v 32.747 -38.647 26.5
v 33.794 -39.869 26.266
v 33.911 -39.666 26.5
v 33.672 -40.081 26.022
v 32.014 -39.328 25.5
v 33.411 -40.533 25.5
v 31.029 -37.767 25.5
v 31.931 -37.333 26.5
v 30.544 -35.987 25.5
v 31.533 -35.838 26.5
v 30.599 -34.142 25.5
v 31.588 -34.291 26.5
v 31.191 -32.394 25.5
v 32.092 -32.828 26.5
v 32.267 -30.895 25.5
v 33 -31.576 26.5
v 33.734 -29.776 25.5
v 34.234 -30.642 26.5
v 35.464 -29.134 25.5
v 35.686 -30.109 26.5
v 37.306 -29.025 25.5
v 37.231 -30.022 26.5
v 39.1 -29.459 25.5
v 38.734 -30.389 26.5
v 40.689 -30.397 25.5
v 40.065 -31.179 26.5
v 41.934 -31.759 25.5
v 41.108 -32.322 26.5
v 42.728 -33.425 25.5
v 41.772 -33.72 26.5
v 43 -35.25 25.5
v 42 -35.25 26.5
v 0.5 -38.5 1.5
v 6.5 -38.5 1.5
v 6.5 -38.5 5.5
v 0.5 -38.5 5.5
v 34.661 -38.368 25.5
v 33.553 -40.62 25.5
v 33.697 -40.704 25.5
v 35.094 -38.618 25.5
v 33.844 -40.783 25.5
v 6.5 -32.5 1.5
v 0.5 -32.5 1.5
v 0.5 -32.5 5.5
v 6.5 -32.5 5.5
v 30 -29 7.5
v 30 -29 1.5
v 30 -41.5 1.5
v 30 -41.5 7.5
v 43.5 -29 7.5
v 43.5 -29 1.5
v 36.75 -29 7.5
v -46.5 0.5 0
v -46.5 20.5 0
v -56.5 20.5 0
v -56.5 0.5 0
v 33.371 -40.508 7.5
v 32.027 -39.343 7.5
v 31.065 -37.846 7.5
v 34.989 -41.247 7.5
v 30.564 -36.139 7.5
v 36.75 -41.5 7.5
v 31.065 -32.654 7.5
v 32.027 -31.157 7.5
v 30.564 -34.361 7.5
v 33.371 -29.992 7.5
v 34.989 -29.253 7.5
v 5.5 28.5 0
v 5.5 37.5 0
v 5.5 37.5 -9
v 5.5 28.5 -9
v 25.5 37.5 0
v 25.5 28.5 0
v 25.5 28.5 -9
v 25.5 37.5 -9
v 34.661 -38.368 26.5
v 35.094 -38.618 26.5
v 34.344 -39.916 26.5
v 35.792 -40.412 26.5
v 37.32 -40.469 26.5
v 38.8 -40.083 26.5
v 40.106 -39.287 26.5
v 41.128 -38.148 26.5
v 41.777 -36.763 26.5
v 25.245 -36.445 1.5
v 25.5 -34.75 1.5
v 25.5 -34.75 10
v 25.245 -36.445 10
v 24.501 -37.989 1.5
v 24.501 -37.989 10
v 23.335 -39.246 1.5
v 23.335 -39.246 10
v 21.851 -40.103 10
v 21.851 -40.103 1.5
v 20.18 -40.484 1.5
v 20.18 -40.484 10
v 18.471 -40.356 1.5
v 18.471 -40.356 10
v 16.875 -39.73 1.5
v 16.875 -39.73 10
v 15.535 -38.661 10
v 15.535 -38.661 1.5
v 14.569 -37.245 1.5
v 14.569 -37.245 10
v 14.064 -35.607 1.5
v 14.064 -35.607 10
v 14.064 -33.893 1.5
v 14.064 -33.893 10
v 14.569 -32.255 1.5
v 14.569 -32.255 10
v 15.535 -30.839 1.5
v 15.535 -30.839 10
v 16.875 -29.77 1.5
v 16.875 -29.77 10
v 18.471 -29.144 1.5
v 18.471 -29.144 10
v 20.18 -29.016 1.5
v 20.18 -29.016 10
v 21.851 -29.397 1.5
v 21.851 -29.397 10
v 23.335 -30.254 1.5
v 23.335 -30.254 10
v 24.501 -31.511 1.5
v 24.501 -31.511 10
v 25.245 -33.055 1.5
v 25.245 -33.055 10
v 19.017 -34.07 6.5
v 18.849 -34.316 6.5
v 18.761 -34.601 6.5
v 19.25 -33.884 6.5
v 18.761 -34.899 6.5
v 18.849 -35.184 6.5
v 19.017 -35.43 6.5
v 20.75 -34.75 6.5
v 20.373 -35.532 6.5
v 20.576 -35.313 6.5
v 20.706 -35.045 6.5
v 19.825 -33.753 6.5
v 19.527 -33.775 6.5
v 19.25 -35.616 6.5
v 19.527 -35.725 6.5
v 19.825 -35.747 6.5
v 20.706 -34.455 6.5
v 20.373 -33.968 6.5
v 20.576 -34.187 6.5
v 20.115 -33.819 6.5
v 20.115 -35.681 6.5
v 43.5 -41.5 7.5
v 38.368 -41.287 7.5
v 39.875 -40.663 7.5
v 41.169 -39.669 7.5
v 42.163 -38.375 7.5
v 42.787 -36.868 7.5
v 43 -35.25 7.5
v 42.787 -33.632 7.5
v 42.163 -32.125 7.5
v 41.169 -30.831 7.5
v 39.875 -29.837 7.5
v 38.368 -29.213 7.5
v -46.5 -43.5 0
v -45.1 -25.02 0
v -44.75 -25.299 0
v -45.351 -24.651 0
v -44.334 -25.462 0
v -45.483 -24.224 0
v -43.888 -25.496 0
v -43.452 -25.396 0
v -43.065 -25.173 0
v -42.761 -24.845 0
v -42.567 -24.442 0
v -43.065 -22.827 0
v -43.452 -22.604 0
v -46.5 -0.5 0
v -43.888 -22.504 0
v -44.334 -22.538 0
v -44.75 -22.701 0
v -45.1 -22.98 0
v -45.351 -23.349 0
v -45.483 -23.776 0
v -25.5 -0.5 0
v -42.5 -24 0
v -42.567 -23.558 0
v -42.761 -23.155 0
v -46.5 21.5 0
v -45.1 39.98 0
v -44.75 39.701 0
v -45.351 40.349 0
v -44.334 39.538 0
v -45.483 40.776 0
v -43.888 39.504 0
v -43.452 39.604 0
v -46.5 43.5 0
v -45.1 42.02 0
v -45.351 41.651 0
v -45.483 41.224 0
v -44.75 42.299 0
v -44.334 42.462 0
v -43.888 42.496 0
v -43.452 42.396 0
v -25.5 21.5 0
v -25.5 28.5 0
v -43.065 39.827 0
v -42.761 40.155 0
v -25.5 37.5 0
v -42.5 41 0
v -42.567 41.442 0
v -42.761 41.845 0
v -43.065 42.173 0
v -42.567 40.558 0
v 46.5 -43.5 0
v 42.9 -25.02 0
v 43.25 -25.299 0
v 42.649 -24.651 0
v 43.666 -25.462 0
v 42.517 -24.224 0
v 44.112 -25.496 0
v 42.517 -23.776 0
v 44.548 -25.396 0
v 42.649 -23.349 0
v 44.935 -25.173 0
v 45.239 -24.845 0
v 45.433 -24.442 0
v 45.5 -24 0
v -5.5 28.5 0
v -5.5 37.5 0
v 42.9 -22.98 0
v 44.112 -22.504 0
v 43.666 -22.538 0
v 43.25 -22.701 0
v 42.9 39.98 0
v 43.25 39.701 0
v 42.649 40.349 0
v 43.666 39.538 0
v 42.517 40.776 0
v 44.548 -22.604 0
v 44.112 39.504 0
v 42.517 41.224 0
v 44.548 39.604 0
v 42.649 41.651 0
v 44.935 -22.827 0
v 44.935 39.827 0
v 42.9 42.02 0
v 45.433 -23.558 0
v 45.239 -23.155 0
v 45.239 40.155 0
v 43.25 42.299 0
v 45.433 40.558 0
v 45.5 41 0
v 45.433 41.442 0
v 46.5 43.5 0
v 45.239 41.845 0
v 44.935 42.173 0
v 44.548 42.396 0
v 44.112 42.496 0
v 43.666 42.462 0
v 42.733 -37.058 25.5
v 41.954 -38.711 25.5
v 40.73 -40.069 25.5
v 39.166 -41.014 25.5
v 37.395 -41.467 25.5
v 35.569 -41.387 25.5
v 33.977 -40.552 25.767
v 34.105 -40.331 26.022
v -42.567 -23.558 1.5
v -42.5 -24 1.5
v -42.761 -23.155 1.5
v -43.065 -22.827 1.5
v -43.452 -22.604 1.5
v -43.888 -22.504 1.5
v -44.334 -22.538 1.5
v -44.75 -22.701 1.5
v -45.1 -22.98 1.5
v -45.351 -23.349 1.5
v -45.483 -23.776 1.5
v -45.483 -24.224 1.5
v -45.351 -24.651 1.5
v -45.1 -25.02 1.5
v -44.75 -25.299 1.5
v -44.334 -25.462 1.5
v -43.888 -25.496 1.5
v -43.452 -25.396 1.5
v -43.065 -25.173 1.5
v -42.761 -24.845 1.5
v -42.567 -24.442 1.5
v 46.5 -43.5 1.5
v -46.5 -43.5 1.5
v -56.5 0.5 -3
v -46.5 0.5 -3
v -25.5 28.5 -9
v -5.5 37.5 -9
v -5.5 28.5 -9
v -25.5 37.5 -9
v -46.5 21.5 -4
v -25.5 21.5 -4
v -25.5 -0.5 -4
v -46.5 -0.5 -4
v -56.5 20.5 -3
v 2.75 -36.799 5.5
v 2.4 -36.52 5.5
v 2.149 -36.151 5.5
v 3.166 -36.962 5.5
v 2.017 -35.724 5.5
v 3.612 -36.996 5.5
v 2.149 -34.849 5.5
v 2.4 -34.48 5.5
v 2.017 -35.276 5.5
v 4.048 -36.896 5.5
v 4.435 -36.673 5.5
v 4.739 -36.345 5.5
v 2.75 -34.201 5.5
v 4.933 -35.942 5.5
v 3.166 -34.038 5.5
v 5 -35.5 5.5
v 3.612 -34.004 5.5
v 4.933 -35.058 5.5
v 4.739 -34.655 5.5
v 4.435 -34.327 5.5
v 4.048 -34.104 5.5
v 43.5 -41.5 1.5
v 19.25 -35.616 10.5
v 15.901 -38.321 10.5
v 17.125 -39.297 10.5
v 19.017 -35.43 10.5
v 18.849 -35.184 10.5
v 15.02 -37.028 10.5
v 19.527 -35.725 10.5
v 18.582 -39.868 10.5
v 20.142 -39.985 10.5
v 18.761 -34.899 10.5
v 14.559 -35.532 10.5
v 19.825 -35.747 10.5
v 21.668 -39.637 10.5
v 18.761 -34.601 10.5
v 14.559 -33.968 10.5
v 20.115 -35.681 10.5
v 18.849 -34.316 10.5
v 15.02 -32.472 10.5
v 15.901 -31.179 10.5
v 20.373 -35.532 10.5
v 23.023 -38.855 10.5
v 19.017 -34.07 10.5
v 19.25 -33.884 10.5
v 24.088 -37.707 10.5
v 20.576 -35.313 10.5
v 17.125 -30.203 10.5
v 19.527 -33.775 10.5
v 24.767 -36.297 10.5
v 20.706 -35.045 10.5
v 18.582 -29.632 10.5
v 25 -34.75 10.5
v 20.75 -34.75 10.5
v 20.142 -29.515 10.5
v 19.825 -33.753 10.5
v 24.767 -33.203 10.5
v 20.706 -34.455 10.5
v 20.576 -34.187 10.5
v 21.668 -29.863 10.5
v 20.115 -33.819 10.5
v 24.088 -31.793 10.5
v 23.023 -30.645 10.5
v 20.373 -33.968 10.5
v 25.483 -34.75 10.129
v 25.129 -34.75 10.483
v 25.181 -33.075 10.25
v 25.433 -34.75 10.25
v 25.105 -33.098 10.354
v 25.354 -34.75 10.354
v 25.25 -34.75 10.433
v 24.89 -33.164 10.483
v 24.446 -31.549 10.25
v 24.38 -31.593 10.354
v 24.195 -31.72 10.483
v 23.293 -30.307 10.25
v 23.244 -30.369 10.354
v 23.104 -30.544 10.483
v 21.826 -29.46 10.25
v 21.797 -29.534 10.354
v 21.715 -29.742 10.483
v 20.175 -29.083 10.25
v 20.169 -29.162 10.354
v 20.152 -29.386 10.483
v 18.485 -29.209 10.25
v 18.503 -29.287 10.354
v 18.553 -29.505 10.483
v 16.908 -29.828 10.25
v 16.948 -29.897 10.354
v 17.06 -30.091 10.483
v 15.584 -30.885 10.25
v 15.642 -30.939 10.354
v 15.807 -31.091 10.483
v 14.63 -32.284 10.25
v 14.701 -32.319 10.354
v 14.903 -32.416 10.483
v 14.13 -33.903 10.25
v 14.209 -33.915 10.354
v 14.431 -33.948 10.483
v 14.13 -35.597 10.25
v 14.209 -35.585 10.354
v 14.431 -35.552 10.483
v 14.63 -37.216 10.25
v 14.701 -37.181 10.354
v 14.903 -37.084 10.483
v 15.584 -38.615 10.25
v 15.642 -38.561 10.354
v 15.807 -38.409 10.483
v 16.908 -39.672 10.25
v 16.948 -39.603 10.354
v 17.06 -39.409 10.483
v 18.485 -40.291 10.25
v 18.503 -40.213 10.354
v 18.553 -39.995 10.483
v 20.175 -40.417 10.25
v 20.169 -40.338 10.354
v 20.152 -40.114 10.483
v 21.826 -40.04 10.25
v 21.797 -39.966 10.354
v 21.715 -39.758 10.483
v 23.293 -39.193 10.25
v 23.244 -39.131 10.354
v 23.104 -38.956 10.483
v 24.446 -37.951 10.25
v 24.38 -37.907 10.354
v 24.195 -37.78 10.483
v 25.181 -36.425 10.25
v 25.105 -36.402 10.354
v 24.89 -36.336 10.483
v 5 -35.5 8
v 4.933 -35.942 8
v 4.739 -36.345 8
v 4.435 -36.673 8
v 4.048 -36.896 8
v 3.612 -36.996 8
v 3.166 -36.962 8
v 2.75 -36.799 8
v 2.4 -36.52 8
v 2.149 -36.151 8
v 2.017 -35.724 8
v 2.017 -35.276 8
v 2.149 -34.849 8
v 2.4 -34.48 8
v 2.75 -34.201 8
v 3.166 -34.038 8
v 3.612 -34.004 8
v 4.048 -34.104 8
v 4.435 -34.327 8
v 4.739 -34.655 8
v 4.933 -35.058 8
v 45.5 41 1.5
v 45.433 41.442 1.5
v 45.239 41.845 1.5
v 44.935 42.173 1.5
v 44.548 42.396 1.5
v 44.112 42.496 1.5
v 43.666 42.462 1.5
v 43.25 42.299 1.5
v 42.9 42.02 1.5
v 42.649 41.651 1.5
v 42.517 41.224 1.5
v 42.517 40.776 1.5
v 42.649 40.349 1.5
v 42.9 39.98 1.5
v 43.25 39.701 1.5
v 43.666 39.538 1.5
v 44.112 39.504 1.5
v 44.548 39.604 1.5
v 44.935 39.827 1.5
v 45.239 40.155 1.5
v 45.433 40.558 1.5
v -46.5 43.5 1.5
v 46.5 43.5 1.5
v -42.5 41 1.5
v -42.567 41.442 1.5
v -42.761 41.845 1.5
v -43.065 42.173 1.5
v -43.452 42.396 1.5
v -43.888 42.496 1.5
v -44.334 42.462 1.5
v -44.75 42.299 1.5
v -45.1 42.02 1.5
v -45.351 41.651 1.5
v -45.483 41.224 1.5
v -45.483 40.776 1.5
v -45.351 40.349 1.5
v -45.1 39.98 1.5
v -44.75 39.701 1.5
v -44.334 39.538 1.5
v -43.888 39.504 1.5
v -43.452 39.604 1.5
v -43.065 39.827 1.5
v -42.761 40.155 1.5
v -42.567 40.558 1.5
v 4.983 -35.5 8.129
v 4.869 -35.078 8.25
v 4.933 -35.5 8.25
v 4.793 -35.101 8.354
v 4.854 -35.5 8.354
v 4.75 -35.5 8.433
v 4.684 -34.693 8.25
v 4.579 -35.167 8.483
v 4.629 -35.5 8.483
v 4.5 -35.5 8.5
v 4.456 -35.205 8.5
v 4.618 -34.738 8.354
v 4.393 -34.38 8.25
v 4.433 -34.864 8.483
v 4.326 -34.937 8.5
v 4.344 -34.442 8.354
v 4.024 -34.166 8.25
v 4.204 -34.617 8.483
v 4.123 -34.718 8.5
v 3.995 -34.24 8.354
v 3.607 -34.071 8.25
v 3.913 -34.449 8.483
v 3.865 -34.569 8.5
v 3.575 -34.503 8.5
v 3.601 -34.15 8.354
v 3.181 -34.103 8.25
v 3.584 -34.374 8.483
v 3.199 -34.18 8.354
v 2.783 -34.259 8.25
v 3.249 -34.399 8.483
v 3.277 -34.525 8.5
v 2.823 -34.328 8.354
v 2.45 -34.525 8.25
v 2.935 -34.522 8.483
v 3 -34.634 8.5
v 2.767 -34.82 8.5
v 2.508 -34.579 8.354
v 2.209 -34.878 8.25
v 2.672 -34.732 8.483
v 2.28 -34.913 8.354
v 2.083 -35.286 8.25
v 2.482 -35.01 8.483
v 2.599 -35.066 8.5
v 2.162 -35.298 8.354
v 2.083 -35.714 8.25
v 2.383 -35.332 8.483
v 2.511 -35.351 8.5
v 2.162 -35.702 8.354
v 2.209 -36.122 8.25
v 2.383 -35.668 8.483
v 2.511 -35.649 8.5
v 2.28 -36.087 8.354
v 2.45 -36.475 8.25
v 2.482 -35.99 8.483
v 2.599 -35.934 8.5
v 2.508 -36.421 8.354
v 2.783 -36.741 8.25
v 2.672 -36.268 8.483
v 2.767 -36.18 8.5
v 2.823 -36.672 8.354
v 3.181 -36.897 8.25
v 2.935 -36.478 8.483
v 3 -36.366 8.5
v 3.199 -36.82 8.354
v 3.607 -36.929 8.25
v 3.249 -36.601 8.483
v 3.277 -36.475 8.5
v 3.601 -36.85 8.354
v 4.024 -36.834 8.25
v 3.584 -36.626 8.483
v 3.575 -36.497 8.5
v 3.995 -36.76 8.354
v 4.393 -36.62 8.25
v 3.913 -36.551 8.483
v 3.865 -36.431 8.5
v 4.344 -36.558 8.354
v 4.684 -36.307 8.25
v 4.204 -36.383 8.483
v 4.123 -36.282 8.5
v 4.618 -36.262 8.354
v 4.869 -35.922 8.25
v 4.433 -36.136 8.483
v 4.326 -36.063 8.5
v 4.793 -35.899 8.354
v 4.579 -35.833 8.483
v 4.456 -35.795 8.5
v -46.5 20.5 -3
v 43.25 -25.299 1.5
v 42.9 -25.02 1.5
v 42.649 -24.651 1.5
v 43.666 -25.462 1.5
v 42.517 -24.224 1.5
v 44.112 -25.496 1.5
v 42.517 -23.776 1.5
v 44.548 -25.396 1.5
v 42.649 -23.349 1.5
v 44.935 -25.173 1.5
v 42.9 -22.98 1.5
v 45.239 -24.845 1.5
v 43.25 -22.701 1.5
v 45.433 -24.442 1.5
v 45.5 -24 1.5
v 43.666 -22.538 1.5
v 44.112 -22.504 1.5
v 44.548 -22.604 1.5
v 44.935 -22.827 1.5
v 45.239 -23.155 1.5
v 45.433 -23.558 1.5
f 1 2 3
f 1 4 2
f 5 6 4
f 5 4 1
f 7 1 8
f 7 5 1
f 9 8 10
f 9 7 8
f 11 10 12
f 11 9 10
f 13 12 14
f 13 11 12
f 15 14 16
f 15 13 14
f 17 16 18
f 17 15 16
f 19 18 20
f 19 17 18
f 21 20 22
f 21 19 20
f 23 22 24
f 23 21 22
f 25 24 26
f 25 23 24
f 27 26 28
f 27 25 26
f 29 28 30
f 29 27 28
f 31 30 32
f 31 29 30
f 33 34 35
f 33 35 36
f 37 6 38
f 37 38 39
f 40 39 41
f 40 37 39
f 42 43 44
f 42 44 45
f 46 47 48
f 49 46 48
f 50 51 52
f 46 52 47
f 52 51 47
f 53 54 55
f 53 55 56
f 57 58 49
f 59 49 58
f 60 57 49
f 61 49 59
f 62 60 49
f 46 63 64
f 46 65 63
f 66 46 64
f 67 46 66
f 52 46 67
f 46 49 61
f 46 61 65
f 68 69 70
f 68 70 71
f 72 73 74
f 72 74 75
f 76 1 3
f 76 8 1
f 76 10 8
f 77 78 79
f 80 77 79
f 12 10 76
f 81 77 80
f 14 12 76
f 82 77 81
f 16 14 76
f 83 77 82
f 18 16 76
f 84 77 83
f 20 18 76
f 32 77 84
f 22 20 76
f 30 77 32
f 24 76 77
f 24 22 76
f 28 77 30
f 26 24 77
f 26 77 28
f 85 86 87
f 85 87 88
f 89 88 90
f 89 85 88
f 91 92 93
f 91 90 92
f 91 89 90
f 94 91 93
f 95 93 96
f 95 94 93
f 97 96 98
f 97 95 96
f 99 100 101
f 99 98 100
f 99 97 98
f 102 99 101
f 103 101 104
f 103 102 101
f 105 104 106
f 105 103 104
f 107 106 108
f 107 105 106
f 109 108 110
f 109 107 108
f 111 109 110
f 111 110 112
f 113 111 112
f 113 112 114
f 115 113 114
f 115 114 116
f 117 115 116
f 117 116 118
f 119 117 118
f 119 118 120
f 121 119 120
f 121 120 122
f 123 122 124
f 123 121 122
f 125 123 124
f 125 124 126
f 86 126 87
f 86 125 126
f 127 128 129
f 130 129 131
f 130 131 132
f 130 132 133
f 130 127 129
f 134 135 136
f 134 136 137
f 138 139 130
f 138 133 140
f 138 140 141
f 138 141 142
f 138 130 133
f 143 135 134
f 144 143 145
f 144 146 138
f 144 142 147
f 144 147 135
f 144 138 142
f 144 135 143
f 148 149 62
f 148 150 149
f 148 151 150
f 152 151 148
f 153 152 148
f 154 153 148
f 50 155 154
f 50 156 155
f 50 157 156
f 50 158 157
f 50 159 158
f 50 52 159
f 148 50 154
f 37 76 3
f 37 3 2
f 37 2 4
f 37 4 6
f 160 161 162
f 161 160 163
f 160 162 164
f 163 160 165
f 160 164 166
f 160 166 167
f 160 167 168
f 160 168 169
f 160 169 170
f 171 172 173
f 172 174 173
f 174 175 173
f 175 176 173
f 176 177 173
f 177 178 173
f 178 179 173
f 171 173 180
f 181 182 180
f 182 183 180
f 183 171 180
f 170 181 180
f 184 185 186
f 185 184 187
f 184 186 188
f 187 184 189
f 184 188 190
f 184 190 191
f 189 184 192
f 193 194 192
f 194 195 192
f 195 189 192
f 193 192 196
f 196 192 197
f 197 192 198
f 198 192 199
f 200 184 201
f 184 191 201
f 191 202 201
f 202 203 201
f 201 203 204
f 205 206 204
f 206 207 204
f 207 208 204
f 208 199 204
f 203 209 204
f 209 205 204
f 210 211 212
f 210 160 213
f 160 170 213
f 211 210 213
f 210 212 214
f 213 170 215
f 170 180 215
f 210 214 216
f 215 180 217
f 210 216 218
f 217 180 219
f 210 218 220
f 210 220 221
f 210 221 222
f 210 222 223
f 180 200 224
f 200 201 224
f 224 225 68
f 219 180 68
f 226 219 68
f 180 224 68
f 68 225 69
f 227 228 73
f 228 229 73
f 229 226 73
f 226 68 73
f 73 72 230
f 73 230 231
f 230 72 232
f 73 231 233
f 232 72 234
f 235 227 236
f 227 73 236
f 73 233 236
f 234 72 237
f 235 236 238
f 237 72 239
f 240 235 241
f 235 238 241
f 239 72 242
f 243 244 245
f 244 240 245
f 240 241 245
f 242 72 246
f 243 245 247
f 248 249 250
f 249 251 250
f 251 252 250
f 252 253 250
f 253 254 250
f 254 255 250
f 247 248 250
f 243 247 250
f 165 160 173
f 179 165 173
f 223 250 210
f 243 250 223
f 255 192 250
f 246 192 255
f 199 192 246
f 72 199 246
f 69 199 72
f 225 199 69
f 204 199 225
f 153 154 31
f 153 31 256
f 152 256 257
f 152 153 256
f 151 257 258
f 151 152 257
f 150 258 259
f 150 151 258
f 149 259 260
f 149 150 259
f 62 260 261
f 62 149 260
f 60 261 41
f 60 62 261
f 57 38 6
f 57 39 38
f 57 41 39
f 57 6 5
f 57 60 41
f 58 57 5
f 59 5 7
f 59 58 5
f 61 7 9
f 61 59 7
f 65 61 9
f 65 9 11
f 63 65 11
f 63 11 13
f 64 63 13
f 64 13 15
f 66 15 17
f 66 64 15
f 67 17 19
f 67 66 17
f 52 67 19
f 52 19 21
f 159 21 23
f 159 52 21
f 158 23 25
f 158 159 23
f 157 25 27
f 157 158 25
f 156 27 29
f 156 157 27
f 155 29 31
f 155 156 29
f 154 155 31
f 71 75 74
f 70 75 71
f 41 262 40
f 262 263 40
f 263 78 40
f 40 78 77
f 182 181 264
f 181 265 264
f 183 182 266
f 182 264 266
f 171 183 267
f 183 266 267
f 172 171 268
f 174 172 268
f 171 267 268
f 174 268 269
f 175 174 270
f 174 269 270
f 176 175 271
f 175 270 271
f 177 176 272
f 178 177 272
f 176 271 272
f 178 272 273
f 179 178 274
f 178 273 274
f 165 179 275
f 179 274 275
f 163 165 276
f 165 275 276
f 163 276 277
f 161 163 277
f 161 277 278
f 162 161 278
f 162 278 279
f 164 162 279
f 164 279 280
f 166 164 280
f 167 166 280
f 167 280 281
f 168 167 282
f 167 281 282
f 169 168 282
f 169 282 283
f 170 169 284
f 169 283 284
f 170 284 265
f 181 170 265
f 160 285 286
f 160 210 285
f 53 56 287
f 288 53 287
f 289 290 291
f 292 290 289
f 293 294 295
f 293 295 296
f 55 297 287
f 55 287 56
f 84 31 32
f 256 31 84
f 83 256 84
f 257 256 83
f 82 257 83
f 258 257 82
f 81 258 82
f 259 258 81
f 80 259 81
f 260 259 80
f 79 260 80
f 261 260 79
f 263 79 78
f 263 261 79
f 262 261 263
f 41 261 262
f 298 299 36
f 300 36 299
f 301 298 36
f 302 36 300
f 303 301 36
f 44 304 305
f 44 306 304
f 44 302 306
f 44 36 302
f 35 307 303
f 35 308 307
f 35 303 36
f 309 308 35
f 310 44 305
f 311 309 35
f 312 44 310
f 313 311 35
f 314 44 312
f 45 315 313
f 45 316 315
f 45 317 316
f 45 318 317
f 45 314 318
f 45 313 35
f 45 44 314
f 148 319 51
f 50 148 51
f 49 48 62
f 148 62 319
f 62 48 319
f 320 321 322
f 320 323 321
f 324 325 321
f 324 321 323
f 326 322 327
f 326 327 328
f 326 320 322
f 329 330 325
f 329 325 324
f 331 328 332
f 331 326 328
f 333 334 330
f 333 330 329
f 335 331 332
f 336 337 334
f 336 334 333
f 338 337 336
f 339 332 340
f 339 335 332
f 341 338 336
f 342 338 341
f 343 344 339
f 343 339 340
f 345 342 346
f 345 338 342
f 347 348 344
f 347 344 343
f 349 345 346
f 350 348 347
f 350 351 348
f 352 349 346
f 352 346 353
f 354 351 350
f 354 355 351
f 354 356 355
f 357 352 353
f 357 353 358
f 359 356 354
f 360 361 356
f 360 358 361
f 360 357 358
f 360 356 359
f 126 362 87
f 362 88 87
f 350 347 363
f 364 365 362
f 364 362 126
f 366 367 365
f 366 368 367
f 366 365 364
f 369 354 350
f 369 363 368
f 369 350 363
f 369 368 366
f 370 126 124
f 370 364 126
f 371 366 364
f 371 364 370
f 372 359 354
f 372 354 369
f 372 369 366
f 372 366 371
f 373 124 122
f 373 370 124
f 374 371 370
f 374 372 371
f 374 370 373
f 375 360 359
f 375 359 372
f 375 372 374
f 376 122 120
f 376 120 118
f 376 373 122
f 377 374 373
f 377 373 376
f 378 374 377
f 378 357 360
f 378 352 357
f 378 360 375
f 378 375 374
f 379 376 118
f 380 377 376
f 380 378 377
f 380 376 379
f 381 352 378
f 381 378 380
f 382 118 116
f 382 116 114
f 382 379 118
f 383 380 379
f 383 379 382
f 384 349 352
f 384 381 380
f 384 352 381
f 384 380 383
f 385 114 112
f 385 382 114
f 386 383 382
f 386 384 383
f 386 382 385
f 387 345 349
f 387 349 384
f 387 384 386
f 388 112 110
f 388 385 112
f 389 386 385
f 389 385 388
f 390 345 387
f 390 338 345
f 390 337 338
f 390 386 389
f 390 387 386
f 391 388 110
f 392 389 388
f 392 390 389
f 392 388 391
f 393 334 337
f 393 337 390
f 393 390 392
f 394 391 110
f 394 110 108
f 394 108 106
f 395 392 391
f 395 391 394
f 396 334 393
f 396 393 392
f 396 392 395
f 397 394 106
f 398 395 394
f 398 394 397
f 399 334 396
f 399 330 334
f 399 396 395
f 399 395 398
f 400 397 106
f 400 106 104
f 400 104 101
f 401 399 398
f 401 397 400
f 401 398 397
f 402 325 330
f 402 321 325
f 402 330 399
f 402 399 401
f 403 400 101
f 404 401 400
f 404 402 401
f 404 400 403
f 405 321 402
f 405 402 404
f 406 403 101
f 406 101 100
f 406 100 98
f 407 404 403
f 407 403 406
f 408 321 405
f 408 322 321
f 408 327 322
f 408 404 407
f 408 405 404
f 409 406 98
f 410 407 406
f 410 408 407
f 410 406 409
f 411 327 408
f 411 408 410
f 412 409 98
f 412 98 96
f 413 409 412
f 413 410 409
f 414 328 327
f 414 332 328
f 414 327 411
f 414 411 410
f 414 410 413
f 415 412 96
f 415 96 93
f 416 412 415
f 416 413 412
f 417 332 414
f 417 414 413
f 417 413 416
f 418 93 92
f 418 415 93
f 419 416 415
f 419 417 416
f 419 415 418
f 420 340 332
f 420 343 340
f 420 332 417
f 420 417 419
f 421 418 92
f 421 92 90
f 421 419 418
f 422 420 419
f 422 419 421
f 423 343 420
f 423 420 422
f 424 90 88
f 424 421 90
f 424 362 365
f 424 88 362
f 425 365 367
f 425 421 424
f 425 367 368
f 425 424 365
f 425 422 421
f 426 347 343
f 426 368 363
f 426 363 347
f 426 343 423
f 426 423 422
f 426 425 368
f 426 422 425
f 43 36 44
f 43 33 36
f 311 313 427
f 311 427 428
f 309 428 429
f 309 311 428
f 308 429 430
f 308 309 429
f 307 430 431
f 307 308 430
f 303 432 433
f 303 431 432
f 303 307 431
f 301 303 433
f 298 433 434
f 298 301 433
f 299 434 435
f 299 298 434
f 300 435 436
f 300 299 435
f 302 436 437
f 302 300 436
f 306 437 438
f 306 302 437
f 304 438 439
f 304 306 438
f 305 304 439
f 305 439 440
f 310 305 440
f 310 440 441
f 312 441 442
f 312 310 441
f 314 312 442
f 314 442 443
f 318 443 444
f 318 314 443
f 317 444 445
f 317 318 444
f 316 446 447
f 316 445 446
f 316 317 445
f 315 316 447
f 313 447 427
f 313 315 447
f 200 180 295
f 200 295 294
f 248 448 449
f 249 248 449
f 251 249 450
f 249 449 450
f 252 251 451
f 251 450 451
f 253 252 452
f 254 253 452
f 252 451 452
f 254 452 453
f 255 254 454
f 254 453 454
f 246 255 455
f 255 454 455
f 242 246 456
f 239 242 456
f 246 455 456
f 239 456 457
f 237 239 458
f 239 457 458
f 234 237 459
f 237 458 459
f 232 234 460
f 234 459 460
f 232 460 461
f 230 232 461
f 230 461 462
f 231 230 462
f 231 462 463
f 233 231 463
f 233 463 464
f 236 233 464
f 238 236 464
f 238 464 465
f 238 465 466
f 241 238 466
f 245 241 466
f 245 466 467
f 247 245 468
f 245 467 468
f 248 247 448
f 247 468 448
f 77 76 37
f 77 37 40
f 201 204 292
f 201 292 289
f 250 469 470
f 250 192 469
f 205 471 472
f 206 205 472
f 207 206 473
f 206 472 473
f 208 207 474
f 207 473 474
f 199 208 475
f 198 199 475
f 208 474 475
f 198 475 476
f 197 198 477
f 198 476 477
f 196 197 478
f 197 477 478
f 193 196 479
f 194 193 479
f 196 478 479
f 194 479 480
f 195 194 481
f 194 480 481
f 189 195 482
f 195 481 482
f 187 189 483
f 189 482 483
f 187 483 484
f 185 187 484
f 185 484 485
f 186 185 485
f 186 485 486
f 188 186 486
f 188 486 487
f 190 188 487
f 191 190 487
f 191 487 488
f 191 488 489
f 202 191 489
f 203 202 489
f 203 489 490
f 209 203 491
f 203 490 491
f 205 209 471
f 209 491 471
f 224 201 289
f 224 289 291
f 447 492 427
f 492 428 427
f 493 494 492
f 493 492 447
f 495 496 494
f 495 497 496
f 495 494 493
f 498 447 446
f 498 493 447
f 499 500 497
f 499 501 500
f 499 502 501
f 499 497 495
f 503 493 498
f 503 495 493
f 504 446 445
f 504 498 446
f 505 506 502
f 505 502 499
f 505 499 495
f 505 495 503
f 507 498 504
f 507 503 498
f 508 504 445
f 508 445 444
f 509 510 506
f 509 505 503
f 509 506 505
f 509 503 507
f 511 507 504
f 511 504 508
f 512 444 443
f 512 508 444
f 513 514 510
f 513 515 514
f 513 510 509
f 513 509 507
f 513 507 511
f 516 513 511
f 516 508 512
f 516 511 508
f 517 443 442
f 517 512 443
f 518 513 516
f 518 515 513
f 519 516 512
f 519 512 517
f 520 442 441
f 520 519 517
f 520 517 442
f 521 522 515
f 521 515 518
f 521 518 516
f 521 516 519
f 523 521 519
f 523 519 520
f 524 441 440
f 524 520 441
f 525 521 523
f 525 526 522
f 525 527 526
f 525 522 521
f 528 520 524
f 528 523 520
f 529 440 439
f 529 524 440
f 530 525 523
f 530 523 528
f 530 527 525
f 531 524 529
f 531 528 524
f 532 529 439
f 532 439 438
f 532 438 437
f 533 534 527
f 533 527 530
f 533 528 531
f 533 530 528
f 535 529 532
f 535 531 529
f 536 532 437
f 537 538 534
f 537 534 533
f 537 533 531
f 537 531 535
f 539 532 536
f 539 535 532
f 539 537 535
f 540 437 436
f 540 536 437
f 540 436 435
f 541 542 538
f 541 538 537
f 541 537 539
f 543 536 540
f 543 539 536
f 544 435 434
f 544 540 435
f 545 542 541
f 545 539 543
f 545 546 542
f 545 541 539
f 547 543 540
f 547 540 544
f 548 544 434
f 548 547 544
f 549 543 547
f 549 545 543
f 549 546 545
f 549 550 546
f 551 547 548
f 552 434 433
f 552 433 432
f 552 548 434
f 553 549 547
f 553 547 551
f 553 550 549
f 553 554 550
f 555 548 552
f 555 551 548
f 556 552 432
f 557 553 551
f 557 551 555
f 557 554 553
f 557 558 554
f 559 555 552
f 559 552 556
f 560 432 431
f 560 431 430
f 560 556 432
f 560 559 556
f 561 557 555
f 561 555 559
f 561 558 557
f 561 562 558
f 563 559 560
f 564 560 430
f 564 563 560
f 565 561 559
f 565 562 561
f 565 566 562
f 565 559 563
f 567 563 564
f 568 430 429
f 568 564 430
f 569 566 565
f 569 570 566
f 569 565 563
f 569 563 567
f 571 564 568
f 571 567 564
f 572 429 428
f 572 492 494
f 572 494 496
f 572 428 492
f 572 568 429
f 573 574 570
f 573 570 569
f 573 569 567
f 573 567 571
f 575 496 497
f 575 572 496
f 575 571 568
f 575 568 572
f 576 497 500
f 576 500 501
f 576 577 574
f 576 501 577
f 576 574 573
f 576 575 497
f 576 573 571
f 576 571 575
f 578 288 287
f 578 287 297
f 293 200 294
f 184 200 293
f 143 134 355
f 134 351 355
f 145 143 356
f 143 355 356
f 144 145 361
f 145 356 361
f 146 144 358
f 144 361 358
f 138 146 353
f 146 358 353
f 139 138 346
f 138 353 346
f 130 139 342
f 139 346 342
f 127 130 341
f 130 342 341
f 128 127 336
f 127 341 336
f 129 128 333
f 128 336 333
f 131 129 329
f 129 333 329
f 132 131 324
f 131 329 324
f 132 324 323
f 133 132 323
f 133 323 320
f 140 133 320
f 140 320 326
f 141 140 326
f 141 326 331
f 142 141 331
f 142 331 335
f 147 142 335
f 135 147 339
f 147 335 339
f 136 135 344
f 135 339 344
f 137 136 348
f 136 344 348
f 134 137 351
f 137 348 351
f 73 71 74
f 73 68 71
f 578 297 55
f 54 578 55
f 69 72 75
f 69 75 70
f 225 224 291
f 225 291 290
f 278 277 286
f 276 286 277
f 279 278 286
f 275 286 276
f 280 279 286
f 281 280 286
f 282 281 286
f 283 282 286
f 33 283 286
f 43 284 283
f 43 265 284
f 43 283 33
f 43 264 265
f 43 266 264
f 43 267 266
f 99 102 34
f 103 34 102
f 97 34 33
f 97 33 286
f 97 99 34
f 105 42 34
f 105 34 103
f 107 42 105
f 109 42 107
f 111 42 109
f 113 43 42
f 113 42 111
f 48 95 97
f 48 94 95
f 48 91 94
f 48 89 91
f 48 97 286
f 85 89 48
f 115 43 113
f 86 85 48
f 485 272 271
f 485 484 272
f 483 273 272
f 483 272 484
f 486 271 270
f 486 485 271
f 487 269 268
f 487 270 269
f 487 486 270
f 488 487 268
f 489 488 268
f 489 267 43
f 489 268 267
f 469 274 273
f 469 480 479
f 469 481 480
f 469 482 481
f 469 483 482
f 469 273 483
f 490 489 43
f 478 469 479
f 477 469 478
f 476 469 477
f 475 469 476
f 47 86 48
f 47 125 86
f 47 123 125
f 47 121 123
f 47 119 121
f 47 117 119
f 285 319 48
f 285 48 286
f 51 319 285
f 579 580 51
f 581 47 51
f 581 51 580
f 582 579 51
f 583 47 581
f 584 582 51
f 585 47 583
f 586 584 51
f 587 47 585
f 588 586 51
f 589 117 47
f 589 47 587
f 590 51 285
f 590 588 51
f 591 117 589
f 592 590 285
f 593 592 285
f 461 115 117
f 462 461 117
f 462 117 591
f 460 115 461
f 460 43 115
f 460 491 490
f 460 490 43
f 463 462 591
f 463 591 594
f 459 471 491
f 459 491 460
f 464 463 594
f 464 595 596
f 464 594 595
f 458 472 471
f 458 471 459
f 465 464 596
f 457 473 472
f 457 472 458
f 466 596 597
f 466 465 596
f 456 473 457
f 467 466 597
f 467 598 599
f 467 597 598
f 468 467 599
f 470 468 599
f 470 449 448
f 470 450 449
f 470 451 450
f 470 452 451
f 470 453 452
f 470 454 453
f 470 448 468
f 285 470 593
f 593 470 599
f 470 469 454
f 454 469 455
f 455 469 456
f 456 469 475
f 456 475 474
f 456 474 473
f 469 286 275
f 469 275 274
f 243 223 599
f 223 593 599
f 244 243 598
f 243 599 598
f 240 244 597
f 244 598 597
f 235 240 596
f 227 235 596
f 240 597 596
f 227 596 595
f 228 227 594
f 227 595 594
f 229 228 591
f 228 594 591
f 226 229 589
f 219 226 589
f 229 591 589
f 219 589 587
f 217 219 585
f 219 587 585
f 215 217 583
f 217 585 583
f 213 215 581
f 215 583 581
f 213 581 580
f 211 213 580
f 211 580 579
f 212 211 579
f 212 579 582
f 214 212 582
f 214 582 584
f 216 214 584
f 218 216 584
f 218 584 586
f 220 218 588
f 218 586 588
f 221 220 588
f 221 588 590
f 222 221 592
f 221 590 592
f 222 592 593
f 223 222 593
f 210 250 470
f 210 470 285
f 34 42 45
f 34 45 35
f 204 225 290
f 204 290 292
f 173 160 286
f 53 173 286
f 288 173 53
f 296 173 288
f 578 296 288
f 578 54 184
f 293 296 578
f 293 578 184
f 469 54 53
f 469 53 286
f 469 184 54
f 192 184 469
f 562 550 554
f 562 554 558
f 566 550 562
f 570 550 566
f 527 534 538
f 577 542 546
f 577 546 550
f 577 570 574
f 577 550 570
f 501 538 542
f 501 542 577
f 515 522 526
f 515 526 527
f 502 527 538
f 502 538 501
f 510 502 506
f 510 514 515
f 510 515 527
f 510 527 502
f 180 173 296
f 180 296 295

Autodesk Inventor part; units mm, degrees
ref_plane "YZ Plane" through (0, 0, 0) normal (1, 0, 0) x (0, 1, 0)
ref_plane "XZ Plane" through (0, 0, 0) normal (0, 1, 0) x (-1, 0, 0)
ref_plane "XY Plane" through (0, 0, 0) normal (0, 0, 1) x (1, 0, 0)
sketch "Sketch1" plane through (0, 0, 0) normal (0, 0, 1) x (1, 0, 0)
  line L0 (-46.5, 43.5) -> (46.5, 43.5)
  line L1 (46.5, 43.5) -> (46.5, -43.5)
  line L2 (46.5, -43.5) -> (-46.5, -43.5)
  line L3 (-46.5, -43.5) -> (-46.5, 43.5)
  point P0 (0, 0)
  dimension "d0" = 93
  dimension "d1" = 87
  dimension "d2" = 46.5
  dimension "d3" = 43.5
extrude "Tykkelse Rød PCB" add sketch "Sketch1" along normal blind 1.5
sketch "Sketch2" plane through (0, 0, 1.5) normal (0, 0, 1) x (1, 0, 0)
  line L0 (46.5, 43.5) -> (-46.5, 43.5) projected
  line L1 (-46.5, 43.5) -> (-46.5, -43.5) projected
  line L2 (46.5, -43.5) -> (46.5, 43.5) projected
  circle A0 centre (44, 41) radius 1.5
  circle A1 centre (-44, 41) radius 1.5
  line L3 (45.5, 42.5) -> (45.5, 26.8687) construction
  line L4 (4.2035, 42.5) -> (45.5, 42.5) construction
  line L5 (-45.5, 42.5) -> (-9.5739, 42.5) construction
  line L6 (-45.5, 42.5) -> (-45.5, 29.332) construction
  line L7 (-46.5, -43.5) -> (46.5, -43.5) projected
  circle A2 centre (-44, -24) radius 1.5
  circle A3 centre (44, -24) radius 1.5
  line L8 (45.5, -14.3819) -> (45.5, -25.5) construction
  line L9 (45.5, -25.5) -> (38.4616, -25.5) construction
  line L10 (-45.5, -14.3819) -> (-45.5, -25.5) construction
  line L11 (-36.8227, -25.5) -> (-45.5, -25.5) construction
  point P0 (0, 0)
  dimension "d6" = 3
  dimension "d7" = 3
  dimension "d8" = 1
  dimension "d9" = 1
  dimension "d10" = 1
  dimension "d11" = 1
  dimension "d79" = 1
  dimension "d80" = 3
  dimension "d81" = 65
  dimension "d82" = 3
  dimension "d83" = 1
  dimension "d84" = 65
extrude "Monteringshuller Ø3" cut sketch "Sketch2" against normal up to surface (1.5 mm away) contours A0 | A1 | A2 | A3
sketch "Sketch3" plane through (0, 0, 0) normal (0, 0, -1) x (-1, 0, 0)
  line L0 (46.5, 43.5) -> (-46.5, 43.5) projected
  line L1 (-46.5, 43.5) -> (-46.5, -43.5) projected
  line L2 (46.5, -43.5) -> (46.5, 43.5) projected
  line L3 (-25.5, 37.5) -> (-5.5, 37.5)
  line L4 (-5.5, 37.5) -> (-5.5, 28.5)
  line L5 (-5.5, 28.5) -> (-25.5, 28.5)
  line L6 (-25.5, 28.5) -> (-25.5, 37.5)
  line L7 (5.5, 37.5) -> (25.5, 37.5)
  line L8 (25.5, 37.5) -> (25.5, 28.5)
  line L9 (25.5, 28.5) -> (5.5, 28.5)
  line L10 (5.5, 28.5) -> (5.5, 37.5)
  point P0 (0, 0)
  dimension "d14" = 20
  dimension "d15" = 9
  dimension "d16" = 9
  dimension "d17" = 20
  dimension "d18" = 21
  dimension "d19" = 21
  dimension "d20" = 6
  dimension "d21" = 6
extrude "Sorte Stik" add sketch "Sketch3" along normal blind 9
sketch "Sketch4" plane through (0, 0, 0) normal (0, 0, -1) x (-1, 0, 0)
  line L0 (46.5, 43.5) -> (-46.5, 43.5) projected
  line L1 (46.5, -43.5) -> (46.5, 43.5) projected
  line L2 (25.5, 21.5) -> (46.5, 21.5)
  line L3 (46.5, 21.5) -> (46.5, -0.5)
  line L4 (46.5, -0.5) -> (25.5, -0.5)
  line L5 (25.5, -0.5) -> (25.5, 21.5)
  point P0 (0, 0)
  dimension "d24" = 22
  dimension "d25" = 21
  dimension "d26" = 0
  dimension "d27" = 22
extrude "SD Kort læser" add sketch "Sketch4" along normal blind 4
sketch "Sketch5" plane through (0, 0, 1.5) normal (0, 0, 1) x (1, 0, 0)
  line L0 (-46.5, -43.5) -> (46.5, -43.5) projected
  line L1 (46.5, -43.5) -> (46.5, 43.5) projected
  line L2 (43.5, -29) -> (30, -29)
  line L3 (30, -29) -> (30, -41.5)
  line L4 (30, -41.5) -> (43.5, -41.5)
  line L5 (43.5, -41.5) -> (43.5, -29)
  point P0 (0, 0)
  dimension "d30" = 12.5
  dimension "d31" = 13.5
  dimension "d32" = 3
  dimension "d33" = 2
extrude "Extrusion5" add sketch "Sketch5" along normal blind 6
sketch "Sketch6" plane through (0, 0, 7.5) normal (0, 0, 1) x (1, 0, 0)
  line L0 (43.5, -29) -> (30, -29) projected
  line L1 (30, -29) -> (30, -41.5) projected
  line L2 (30, -41.5) -> (43.5, -41.5) projected
  circle A0 centre (36.75, -35.25) radius 6.25
  point P0 (0, 0)
  dimension "d36" = 6.75
  dimension "d37" = 13.5
extrude "Extrusion6" add sketch "Sketch6" along normal blind 19 contours A0
chamfer "Chamfer1" distance 1 angle 45 1 edges at (30.5, -35.25, 26.5)
sketch "Sketch7" plane through (0, 0, 1.5) normal (0, 0, 1) x (1, 0, 0)
  line L0 (-46.5, -43.5) -> (46.5, -43.5) projected
  line L1 (46.5, -43.5) -> (46.5, 43.5) projected
  circle A0 centre (19.75, -34.75) radius 5.75
  line L2 (25.5, -40.5) -> (6.0957, -40.5) construction
  line L3 (25.5, -23.1538) -> (25.5, -40.5) construction
  point P0 (0, 0)
  dimension "d43" = 11.5
  dimension "d44" = 3
  dimension "d45" = 21
extrude "Extrusion7" add sketch "Sketch7" along normal blind 9
sketch "Sketch8" plane through (19.75, -34.75, 10.5) normal (0, 0, 1) x (1, 0, 0)
  circle A0 centre (0, 0) radius 5.75 projected
  circle A1 centre (0, 0) radius 1
  point P0 (-19.75, 34.75)
  dimension "d48" = 2
extrude "Extrusion8" cut sketch "Sketch8" against normal blind 4 contours A1
sketch "Sketch9" plane through (0, 0, 1.5) normal (0, 0, 1) x (1, 0, 0)
  line L0 (-46.5, -43.5) -> (46.5, -43.5) projected
  line L1 (46.5, -43.5) -> (46.5, 43.5) projected
  line L2 (0.5, -32.5) -> (6.5, -32.5)
  line L3 (6.5, -32.5) -> (6.5, -38.5)
  line L4 (6.5, -38.5) -> (0.5, -38.5)
  line L5 (0.5, -38.5) -> (0.5, -32.5)
  point P0 (0, 0)
  dimension "d51" = 6
  dimension "d52" = 6
  dimension "d53" = 5
  dimension "d54" = 40
extrude "Extrusion9" add sketch "Sketch9" along normal blind 4
sketch "Sketch10" plane through (0, 0, 5.5) normal (0, 0, 1) x (1, 0, 0)
  line L0 (6.5, -32.5) -> (0.5, -32.5) projected
  line L1 (6.5, -38.5) -> (6.5, -32.5) projected
  circle A0 centre (3.5, -35.5) radius 1.5
  point P0 (0, 0)
  dimension "d57" = 3
  dimension "d58" = 6
  dimension "d59" = 6
  dimension "d60" = 3
  dimension "d61" = 3
extrude "Extrusion10" add sketch "Sketch10" along normal blind 3
fillet "Fillet1" radius 0.5 1 edges at (2, -35.5, 8.5)
fillet "Fillet2" radius 0.5 1 edges at (14, -34.75, 10.5)
sketch "Sketch11" plane through (36.75, -35.25, 26.5) normal (0, 0, 1) x (1, 0, 0)
  circle A0 centre (0, 0) radius 5.25 projected
  line L0 (0, 0) -> (0, -4.739) construction
  line L1 (0, 0) -> (-2.5895, -4.4851) construction
  line L2 (-2.089, -3.1183) -> (-3.339, -5.2833)
  line L3 (-2.089, -3.1183) -> (-1.656, -3.3683)
  circle A1 centre (0, 0) radius 6.25 projected
  circle A2 centre (0, 0) radius 5.25 projected
  line L4 (-2.906, -5.5333) -> (-1.656, -3.3683)
  point P0 (-36.75, 35.25)
  dimension "d66" = 30
  dimension "d68" = 0.25
  dimension "d69" = 2.5
  dimension "d70" = 0.5
extrude "Extrusion11" cut sketch "Sketch11" against normal blind 1 contours L2 L3 L4 A0 | A0 L4 A1 L2 picked at (-2.0992, -3.6914) picked at (-2.6213, -4.9292)
sketch "Sketch12" plane through (-46.5, -43.5, 1.5) normal (-1, 0, 0) x (0, 0, 1)
  line L0 (-1.5, 65) -> (-1.5, 87) projected
  line L1 (-1.5, 65) -> (-5.5, 65) projected
  line L2 (-5.5, 43) -> (-5.5, 65) projected
  line L3 (-1.5, 43) -> (-5.5, 43) projected
  line L4 (-4.5, 64) -> (-1.5, 64)
  line L5 (-1.5, 64) -> (-1.5, 44)
  line L6 (-1.5, 44) -> (-4.5, 44)
  line L7 (-4.5, 44) -> (-4.5, 64)
  point P0 (-1.5, 43.5)
  dimension "d73" = 1
  dimension "d74" = 1
  dimension "d75" = 1
  dimension "d76" = 0
extrude "Extrusion12" add sketch "Sketch12" along normal blind 10
sketch "Sketch13" plane through (0, 0, 26.5) normal (0, 0, 1) x (1, 0, 0)
  arc A0 (-34.5, 28.5) -> (-36.5, 26.5) centre (-34.5, 26.5) ccw projected
  line L0 (-34.5, 28.5) -> (34.5, 28.5) projected
  arc A1 (36.5, 26.5) -> (34.5, 28.5) centre (34.5, 26.5) ccw projected
  line L1 (36.5, 26.5) -> (36.5, -8.5) projected
  arc A2 (34.5, -10.5) -> (36.5, -8.5) centre (34.5, -8.5) ccw projected
  line L2 (34.5, -10.5) -> (-34.5, -10.5) projected
  arc A3 (-36.5, -8.5) -> (-34.5, -10.5) centre (-34.5, -8.5) ccw projected
  line L3 (-36.5, -8.5) -> (-36.5, 26.5) projected
  line L4 (39, 34.5) -> (-39, 34.5) projected
  line L5 (-39, 34.5) -> (-39, -16.5) projected
  line L6 (-39, -16.5) -> (39, -16.5) projected
  line L7 (39, -16.5) -> (39, 34.5) projected
  line L8 (-39, 30.5) -> (-39, -11.5) projected
  line L9 (-39, 30.5) -> (-45.5, 30.5) projected
  line L10 (-45.5, 30.5) -> (-45.5, -11.5) projected
  line L11 (-45.5, -11.5) -> (-39, -11.5) projected
  circle A4 centre (3.5, -35.5) radius 1.5 projected
  circle A5 centre (19.75, -34.75) radius 5.75 projected
  arc A6 (33.844, -40.7833) -> (33.411, -40.5333) centre (36.75, -35.25) ccw projected
  line L12 (-34.5, 26.5) -> (34.5, -8.5) construction
  line L13 (34.5, 26.5) -> (-34.5, -8.5) construction
  line L14 (0, 28.5) -> (0, 9) construction
  point P0 (0, 0)
  dimension "d85" = 36.75
  dimension "d86" = 6.25
  dimension "d87" = 11.5
  dimension "d88" = 19.75
  dimension "d89" = 3
  dimension "d90" = 3.5
  dimension "d91" = 44.5
  dimension "d92" = 43.75
  dimension "d93" = 44.25
equation "\"d2\" = 0.5 * d0"
equation "\"d3\" = 0.5 * d1"
equation "\"d16\" = d15"
equation "\"d17\" = d14"
equation "\"d19\" = d18"
equation "\"d21\" = d20"
equation "\"d36\" = 0.5 * d37"
equation "\"d60\" = 0.5 * d58"
equation "\"d61\" = 0.5 * d59"
equation "\"d68\" = 0.5 * d70"
properties part number "Rød PCB"
